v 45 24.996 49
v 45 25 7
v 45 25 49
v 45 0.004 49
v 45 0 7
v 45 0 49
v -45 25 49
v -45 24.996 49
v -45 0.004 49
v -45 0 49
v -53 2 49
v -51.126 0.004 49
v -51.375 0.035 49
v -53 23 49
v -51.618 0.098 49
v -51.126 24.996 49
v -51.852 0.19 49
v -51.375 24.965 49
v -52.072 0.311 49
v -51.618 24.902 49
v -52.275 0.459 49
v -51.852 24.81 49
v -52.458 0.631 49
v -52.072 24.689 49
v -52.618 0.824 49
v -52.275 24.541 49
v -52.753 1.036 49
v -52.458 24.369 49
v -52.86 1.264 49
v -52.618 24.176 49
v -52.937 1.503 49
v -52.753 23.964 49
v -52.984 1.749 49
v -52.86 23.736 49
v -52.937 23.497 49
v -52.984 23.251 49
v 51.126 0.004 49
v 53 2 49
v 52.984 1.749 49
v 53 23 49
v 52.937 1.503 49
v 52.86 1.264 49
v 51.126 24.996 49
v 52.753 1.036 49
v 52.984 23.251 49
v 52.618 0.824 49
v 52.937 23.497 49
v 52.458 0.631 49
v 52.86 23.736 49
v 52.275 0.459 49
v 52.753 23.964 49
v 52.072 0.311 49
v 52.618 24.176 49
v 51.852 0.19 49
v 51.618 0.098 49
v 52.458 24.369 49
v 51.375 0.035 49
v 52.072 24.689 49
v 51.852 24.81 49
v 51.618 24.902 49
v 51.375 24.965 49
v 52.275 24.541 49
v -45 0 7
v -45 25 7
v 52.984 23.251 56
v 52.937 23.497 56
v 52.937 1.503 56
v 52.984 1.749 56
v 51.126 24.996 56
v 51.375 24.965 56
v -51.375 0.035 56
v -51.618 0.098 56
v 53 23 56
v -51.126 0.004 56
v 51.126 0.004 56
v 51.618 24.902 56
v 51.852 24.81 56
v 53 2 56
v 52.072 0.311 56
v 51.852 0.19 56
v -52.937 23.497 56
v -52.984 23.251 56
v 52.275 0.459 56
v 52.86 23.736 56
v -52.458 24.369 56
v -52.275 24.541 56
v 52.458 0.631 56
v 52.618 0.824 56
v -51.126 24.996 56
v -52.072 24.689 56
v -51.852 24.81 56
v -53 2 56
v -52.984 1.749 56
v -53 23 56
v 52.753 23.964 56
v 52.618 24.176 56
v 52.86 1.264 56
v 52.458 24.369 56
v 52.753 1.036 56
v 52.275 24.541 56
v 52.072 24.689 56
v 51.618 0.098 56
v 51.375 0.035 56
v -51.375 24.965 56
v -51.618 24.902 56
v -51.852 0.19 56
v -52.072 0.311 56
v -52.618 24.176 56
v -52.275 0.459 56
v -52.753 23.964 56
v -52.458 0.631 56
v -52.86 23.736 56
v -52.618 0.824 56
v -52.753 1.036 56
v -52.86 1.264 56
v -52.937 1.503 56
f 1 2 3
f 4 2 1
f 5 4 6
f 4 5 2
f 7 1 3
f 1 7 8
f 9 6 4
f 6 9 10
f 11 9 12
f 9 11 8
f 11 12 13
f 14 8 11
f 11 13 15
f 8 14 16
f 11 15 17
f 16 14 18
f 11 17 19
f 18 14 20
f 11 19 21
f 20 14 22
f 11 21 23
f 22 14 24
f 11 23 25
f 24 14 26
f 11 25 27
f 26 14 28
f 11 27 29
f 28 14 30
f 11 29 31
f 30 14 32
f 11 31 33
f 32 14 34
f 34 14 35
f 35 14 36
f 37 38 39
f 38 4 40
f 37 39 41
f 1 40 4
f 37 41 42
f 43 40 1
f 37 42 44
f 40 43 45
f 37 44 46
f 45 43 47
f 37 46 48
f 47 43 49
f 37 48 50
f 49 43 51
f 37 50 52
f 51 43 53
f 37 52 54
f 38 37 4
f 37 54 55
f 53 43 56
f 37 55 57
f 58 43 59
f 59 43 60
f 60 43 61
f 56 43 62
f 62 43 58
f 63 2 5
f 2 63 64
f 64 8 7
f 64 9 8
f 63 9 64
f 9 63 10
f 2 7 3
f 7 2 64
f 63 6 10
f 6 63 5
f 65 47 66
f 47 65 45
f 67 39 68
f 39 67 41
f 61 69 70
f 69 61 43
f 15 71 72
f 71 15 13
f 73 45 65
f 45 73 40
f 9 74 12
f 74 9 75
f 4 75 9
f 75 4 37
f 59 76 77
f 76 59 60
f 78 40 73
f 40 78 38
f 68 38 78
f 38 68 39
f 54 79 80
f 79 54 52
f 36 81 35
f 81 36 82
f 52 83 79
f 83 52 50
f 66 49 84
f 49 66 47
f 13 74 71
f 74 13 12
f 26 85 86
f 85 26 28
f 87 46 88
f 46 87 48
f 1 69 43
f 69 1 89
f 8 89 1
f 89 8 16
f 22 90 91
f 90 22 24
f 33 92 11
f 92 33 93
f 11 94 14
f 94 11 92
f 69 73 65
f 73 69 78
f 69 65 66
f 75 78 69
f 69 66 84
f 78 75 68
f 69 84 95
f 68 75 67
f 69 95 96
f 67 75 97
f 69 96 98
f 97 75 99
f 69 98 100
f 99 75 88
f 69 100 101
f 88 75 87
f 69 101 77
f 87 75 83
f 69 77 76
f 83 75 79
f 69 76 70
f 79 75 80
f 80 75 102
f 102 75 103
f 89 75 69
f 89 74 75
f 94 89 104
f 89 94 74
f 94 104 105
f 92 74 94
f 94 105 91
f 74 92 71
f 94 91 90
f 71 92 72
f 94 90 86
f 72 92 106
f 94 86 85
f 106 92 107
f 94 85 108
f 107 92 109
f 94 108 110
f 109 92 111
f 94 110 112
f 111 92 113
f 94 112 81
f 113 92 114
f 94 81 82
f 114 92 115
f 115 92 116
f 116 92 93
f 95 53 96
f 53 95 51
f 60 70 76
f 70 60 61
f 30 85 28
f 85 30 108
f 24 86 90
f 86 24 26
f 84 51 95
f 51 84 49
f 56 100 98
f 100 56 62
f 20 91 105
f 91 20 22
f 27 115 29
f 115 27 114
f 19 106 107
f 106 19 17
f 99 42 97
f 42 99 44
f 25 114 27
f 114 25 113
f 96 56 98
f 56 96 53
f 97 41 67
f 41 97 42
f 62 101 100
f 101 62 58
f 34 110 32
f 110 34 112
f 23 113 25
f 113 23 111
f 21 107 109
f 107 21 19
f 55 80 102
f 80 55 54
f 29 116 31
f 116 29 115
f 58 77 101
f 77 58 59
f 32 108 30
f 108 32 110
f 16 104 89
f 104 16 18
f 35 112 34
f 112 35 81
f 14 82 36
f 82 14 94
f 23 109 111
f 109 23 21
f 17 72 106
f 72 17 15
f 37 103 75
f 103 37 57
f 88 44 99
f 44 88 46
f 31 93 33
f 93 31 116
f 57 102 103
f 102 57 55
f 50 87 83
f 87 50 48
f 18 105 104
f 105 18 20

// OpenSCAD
bus_card_height = 52;
bus_card_width = 90;
bus_card_thickness = .5;
slop = 2;
top_exposure = 10;
num_cards = 100;
wall_thickness = 5;
slot_width = 20;
$fn = 50;

holder_width = bus_card_width + slop + 2*wall_thickness;
holder_depth = num_cards * bus_card_thickness + 2*wall_thickness;
holder_height = wall_thickness + bus_card_height - top_exposure;
cutout_width = bus_card_width + slop;
cutout_depth = num_cards * bus_card_thickness;
cutout_height = bus_card_height;

filler_width = bus_card_width;
filler_depth = (num_cards / 2) * bus_card_thickness;
filler_height = holder_height - wall_thickness;
filler_protrude_height = wall_thickness;
filler_protrude_width = holder_width;

%difference(){
difference() {
translate([-holder_width/2,-holder_depth/2,0])
minkowski(){
cube([holder_width, holder_depth, holder_height]);
    cylinder(h=2,r=2);
}
translate([-cutout_width/2,-cutout_depth/2,wall_thickness])
cube([cutout_width,cutout_depth,cutout_height]);
}

union(){
translate([0,0,wall_thickness+slot_width/2])
rotate([90,0,0])
cylinder(holder_depth, d=slot_width, false);
translate([-slot_width/2,-holder_depth,wall_thickness+slot_width/2])
cube([slot_width,holder_depth,holder_height]);
}
}

union(){
translate([-filler_width/2,0,wall_thickness+slop])
cube([filler_width,filler_depth,filler_height]);
translate([-filler_protrude_width/2,2,filler_height+wall_thickness+slop])
minkowski(){
cube([filler_protrude_width,filler_depth-4,filler_protrude_height]);
    cylinder(h=2,r=2);
}
}
